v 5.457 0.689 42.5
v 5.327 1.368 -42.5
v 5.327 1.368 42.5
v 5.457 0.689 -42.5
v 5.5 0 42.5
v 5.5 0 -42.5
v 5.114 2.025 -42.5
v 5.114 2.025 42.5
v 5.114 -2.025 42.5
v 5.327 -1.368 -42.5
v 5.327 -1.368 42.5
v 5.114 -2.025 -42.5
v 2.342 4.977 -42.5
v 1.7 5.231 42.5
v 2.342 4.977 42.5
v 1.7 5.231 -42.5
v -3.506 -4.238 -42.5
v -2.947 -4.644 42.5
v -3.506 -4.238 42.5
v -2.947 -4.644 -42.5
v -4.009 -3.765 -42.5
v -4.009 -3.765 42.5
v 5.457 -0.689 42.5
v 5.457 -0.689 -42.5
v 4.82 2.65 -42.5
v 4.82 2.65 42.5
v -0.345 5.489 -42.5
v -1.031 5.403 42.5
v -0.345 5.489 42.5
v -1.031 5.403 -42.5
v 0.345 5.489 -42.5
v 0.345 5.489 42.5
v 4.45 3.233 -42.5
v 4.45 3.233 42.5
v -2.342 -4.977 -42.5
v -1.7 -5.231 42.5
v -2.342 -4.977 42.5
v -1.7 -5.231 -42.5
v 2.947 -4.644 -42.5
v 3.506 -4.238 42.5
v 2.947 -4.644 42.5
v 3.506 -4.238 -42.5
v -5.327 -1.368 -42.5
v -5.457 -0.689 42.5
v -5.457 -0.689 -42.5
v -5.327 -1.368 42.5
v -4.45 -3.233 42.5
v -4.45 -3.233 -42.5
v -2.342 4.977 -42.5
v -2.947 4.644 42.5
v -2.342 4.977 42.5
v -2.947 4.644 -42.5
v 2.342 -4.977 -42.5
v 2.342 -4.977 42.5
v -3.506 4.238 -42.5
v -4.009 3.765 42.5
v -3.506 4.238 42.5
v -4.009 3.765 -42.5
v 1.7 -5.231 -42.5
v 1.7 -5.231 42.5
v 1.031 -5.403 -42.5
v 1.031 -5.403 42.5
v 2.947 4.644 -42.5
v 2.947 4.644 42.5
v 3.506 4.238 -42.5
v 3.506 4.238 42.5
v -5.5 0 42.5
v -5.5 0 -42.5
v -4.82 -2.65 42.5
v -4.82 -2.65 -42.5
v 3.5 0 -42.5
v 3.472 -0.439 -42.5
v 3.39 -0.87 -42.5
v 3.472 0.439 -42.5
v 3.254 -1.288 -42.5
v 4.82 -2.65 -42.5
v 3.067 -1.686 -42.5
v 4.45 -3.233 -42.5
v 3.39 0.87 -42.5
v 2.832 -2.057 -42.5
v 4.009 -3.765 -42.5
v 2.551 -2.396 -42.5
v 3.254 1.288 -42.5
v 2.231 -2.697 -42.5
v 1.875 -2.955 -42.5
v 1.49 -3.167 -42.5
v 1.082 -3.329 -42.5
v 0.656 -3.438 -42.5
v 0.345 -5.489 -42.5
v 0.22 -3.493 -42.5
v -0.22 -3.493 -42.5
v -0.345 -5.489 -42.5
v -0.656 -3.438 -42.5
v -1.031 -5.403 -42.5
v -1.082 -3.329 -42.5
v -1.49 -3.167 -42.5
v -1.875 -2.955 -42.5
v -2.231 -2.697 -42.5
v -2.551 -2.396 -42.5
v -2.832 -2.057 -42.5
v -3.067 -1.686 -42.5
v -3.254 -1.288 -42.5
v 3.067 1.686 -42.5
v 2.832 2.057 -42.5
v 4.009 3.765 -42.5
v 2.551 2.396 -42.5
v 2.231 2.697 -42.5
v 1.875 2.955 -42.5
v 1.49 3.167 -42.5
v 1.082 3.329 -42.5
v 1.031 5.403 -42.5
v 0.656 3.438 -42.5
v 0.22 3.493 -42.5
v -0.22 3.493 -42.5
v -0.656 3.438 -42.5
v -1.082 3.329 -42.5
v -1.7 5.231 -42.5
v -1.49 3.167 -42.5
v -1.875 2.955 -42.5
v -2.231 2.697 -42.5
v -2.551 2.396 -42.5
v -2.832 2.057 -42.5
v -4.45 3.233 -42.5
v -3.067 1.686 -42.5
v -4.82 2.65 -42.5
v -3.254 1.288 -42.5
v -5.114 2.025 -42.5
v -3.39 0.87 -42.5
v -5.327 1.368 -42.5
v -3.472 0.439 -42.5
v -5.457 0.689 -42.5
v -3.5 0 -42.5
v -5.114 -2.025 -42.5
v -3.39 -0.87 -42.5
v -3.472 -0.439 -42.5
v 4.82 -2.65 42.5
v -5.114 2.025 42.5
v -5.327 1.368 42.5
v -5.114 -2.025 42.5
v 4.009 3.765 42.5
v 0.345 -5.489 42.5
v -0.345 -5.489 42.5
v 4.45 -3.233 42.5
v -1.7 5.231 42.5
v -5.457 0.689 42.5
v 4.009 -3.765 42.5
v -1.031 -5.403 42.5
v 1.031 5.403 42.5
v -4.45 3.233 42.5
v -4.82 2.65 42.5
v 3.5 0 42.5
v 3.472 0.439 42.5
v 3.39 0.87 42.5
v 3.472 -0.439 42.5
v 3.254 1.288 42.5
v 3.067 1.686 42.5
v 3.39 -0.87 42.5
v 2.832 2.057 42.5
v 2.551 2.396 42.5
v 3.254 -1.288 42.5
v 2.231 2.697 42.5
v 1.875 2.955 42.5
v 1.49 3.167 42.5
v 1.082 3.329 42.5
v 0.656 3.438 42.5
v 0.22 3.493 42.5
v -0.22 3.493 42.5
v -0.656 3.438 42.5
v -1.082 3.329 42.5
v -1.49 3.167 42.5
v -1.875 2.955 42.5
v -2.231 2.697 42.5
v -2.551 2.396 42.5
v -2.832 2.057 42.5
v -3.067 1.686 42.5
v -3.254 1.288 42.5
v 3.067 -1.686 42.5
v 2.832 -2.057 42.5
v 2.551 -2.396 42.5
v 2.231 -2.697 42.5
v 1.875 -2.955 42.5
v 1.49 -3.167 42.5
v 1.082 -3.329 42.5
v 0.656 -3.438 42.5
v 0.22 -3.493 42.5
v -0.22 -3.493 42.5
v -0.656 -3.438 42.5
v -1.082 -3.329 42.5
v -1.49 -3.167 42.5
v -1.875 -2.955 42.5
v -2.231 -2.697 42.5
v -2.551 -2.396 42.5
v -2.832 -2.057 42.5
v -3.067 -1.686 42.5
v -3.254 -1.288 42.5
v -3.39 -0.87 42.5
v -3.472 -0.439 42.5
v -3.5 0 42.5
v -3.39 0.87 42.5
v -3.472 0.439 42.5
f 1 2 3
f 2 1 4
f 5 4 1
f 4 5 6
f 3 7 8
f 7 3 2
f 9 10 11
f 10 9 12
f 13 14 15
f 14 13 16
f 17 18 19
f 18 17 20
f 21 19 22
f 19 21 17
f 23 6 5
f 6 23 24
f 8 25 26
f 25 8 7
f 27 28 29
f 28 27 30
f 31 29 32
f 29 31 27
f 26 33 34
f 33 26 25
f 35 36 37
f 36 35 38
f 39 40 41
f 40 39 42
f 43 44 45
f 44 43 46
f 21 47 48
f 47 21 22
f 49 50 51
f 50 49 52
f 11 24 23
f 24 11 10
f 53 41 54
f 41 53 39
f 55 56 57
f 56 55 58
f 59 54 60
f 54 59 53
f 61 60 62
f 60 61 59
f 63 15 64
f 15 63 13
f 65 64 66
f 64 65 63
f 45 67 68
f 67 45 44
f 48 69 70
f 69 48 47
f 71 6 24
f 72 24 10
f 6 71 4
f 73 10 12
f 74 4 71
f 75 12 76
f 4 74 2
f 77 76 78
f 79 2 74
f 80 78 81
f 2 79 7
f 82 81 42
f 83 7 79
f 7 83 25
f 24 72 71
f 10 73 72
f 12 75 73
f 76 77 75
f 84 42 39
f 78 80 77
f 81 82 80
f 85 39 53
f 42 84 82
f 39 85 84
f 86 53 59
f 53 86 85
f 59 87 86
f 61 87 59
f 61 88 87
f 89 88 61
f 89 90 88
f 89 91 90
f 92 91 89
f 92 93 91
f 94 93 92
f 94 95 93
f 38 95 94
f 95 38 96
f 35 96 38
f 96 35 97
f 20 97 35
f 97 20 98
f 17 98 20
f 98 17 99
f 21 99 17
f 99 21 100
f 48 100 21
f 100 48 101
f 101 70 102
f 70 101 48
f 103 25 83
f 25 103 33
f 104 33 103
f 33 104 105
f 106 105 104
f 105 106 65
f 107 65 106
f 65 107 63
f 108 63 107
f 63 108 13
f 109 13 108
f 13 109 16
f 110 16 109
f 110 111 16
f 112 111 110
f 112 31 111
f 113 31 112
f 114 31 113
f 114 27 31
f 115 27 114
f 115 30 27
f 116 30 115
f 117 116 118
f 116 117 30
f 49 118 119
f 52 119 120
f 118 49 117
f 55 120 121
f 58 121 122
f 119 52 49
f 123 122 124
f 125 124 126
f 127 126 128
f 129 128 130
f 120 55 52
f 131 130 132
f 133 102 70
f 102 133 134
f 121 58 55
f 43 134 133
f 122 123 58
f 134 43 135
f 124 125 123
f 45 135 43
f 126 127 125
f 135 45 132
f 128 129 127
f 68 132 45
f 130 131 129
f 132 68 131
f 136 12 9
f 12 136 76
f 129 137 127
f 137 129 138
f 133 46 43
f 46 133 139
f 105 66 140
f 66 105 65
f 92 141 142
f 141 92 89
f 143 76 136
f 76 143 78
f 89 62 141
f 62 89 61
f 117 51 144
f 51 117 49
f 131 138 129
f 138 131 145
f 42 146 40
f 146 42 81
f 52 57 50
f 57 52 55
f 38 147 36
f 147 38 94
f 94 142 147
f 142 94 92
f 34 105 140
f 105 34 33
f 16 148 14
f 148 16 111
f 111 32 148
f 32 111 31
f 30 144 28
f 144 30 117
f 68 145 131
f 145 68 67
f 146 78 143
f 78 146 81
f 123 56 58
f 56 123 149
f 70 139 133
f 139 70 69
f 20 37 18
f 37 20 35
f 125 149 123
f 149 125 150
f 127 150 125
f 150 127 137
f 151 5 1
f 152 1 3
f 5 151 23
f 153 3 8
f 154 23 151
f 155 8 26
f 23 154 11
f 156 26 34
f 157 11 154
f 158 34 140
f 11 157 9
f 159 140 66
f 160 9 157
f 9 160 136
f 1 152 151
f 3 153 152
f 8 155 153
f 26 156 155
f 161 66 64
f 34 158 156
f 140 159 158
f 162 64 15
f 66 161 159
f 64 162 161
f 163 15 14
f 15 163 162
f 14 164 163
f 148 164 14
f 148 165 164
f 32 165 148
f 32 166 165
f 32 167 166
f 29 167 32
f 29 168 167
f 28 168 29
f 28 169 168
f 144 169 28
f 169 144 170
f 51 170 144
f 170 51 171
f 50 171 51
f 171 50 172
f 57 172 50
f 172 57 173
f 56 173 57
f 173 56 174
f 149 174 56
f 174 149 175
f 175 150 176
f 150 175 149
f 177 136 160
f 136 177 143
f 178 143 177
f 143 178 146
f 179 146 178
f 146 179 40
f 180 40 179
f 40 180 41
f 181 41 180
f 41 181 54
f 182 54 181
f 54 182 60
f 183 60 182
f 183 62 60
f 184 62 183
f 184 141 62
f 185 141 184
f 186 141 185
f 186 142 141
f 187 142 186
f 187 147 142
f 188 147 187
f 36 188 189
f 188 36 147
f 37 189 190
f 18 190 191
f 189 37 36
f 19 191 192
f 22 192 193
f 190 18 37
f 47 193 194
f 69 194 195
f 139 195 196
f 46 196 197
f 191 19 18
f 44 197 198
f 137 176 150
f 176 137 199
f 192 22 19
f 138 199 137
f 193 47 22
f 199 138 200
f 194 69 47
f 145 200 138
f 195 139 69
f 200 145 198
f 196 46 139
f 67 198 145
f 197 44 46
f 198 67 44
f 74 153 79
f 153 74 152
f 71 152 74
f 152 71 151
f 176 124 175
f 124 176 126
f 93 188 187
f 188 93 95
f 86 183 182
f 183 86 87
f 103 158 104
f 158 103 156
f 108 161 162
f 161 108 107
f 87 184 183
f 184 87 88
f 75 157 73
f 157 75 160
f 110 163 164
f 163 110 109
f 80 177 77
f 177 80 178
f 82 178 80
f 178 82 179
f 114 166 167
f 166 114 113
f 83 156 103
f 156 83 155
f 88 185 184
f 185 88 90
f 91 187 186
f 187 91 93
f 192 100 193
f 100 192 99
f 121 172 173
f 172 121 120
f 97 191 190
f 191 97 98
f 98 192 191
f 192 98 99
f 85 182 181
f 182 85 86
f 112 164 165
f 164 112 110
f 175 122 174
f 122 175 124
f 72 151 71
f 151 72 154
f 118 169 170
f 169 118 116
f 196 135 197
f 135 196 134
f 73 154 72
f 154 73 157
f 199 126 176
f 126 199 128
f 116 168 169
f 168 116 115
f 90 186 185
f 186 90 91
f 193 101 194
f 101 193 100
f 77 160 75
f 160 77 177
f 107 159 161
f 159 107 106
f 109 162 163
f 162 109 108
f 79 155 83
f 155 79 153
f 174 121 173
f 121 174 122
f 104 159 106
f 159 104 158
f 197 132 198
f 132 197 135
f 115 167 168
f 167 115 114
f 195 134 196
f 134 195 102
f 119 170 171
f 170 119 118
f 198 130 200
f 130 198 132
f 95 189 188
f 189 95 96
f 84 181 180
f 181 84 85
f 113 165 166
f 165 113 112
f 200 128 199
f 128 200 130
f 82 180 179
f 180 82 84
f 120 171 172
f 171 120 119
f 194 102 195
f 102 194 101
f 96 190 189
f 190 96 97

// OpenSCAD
$fn = 50;


difference() {
	union() {
		translate(v = [0, 0, -42.5000000000]) {
			cylinder(h = 85, r = 5.5000000000);
		}
	}
	union() {
		translate(v = [0, 0, -100.0000000000]) {
			cylinder(h = 200, r = 3.5000000000);
		}
	}
}
